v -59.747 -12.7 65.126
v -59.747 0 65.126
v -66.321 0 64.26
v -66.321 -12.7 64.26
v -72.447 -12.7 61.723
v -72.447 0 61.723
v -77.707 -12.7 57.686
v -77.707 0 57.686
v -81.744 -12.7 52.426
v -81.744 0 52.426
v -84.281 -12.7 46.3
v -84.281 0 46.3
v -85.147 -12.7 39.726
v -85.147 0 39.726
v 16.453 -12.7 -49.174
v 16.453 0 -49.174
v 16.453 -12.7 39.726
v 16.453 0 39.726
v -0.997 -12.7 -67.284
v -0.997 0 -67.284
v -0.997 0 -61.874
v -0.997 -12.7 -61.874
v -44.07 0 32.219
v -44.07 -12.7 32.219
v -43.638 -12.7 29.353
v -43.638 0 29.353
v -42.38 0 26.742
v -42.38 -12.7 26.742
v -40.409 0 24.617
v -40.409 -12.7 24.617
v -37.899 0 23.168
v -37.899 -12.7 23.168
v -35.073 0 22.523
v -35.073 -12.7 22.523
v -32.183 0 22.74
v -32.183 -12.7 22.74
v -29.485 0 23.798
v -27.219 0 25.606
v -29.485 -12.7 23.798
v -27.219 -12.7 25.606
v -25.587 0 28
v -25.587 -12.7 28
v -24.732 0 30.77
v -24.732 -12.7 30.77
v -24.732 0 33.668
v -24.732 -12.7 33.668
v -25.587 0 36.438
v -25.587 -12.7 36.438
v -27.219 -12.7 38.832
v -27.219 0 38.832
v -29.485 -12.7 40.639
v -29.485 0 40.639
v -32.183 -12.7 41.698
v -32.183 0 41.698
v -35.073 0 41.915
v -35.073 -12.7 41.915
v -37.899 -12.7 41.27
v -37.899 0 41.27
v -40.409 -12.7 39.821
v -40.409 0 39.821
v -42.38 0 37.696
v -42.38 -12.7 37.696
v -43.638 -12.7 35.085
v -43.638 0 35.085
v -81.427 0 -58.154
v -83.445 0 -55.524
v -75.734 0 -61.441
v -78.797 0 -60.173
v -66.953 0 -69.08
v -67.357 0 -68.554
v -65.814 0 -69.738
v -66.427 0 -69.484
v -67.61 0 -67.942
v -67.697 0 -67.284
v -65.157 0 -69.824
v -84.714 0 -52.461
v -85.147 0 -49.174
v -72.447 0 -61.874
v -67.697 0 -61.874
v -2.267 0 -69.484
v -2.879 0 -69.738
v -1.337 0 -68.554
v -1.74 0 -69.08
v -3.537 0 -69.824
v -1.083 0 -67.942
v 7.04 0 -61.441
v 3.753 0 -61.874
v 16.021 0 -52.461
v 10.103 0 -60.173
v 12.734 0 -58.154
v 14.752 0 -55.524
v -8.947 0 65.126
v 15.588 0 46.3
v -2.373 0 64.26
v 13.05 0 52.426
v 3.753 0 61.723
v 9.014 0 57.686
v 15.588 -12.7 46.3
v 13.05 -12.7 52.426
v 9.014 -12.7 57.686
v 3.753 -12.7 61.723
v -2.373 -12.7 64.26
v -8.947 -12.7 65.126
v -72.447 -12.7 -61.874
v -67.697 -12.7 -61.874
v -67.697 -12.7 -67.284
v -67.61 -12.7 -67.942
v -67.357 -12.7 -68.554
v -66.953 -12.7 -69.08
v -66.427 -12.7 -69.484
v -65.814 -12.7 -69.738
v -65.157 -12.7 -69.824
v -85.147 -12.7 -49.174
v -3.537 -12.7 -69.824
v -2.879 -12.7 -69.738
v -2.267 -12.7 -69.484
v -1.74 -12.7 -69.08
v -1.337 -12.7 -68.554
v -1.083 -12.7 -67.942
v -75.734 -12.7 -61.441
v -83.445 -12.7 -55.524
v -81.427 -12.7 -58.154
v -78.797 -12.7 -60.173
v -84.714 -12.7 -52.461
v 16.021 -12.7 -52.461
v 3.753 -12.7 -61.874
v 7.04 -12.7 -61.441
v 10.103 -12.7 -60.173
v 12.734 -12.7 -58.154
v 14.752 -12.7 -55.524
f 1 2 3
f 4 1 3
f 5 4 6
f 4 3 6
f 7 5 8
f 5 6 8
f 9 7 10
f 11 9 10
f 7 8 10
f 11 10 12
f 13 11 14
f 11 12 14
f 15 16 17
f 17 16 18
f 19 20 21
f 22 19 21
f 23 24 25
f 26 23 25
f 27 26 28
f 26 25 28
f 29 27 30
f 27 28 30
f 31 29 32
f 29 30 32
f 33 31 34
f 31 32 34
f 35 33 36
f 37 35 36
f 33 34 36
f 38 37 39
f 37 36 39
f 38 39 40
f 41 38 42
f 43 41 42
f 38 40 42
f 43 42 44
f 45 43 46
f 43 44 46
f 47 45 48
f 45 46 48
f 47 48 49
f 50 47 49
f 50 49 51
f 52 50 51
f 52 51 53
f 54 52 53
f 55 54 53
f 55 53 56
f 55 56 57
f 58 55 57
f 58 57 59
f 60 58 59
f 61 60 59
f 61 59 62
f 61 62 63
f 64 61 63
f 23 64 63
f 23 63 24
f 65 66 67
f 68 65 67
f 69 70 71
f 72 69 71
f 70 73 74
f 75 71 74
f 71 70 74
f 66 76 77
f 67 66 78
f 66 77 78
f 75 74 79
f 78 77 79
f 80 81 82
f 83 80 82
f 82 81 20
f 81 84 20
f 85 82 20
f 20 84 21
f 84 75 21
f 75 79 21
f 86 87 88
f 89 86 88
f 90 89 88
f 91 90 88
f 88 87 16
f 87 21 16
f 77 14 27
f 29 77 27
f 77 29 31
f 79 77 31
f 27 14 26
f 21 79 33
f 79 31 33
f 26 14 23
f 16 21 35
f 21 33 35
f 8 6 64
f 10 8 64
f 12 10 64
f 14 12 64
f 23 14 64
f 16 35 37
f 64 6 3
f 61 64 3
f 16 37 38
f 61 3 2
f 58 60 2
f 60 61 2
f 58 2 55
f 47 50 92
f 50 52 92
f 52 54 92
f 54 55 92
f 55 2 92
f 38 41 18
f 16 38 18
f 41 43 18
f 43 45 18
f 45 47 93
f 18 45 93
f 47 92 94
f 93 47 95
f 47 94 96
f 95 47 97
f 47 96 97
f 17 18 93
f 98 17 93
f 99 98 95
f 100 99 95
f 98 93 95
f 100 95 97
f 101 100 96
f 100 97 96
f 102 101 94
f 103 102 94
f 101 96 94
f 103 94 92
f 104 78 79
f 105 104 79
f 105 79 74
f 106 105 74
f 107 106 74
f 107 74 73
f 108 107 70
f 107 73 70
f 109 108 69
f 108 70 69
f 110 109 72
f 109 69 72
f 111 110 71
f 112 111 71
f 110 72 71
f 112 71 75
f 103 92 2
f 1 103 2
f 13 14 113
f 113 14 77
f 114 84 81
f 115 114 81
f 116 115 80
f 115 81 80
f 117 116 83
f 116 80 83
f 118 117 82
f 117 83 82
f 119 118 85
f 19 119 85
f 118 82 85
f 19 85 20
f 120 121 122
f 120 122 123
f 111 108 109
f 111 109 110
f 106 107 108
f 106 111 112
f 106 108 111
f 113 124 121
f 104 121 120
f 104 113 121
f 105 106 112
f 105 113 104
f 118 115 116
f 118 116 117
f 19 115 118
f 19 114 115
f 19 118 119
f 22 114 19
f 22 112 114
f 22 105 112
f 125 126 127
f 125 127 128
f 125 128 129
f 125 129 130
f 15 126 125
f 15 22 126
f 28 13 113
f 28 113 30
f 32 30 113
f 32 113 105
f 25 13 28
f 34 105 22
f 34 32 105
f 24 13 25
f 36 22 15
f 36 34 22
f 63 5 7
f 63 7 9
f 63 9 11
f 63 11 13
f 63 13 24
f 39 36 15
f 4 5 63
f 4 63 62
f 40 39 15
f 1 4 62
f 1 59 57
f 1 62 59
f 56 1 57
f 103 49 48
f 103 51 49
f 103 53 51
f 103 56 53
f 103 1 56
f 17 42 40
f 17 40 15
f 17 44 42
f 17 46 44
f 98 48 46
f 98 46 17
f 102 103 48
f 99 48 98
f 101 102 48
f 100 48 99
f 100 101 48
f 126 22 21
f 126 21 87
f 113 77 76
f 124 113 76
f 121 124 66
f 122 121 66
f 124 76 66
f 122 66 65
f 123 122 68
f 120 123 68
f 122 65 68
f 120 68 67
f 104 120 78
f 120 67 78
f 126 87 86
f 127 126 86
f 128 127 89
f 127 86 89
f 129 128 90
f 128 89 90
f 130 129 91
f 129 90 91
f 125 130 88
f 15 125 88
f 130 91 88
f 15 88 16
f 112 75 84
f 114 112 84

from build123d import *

# Parameters (mm, degrees)
F1_DEPTH = 12.7
F2_D     = 19.44624


with BuildPart() as f1:
    # F0 (on Front) → F1 (new body)
    with BuildSketch(Plane.XZ):
        with BuildLine():
            Line((-8.9467406929, 65.1259068947), (-59.7467406929, 65.1259068947))
            ThreePointArc((-59.7467406929, 65.1259068947), (-77.707252935, 57.6864191368), (-85.1467406929, 39.7259068947))
            Line((-85.1467406929, 39.7259068947), (-85.1467406929, -49.1740931053))
            ThreePointArc((-85.1467406929, -49.1740931053), (-81.4269968139, -58.1543492264), (-72.4467406929, -61.8740931053))
            Line((-72.4467406929, -61.8740931053), (-67.6969406929, -61.8740931053))
            Line((-67.6969406929, -61.8740931053), (-67.6969406929, -67.2842931053))
            ThreePointArc((-67.6969406929, -67.2842931053), (-66.9529919171, -69.0803443295), (-65.1569406929, -69.8242931053))
            Line((-65.1569406929, -69.8242931053), (-3.5365406929, -69.8242931053))
            ThreePointArc((-3.5365406929, -69.8242931053), (-1.7404894686, -69.0803443295), (-0.9965406929, -67.2842931053))
            Line((-0.9965406929, -67.2842931053), (-0.9965406929, -61.8740931053))
            Line((-0.9965406929, -61.8740931053), (3.7532593071, -61.8740931053))
            ThreePointArc((3.7532593071, -61.8740931053), (12.7335154282, -58.1543492264), (16.4532593071, -49.1740931053))
            Line((16.4532593071, -49.1740931053), (16.4532593071, 39.7259068947))
            ThreePointArc((16.4532593071, 39.7259068947), (9.0137715493, 57.6864191368), (-8.9467406929, 65.1259068947))
        make_face()
    extrude(amount=F1_DEPTH)

    # F2 (through all)
    with Locations(Plane(origin=(0, 0, 0), x_dir=(1, 0, 0), z_dir=(0, 1, 0))):
        with Locations((-34.3467406929, -32.2189068947)):
            Hole(F2_D / 2)


solid = f1.part
